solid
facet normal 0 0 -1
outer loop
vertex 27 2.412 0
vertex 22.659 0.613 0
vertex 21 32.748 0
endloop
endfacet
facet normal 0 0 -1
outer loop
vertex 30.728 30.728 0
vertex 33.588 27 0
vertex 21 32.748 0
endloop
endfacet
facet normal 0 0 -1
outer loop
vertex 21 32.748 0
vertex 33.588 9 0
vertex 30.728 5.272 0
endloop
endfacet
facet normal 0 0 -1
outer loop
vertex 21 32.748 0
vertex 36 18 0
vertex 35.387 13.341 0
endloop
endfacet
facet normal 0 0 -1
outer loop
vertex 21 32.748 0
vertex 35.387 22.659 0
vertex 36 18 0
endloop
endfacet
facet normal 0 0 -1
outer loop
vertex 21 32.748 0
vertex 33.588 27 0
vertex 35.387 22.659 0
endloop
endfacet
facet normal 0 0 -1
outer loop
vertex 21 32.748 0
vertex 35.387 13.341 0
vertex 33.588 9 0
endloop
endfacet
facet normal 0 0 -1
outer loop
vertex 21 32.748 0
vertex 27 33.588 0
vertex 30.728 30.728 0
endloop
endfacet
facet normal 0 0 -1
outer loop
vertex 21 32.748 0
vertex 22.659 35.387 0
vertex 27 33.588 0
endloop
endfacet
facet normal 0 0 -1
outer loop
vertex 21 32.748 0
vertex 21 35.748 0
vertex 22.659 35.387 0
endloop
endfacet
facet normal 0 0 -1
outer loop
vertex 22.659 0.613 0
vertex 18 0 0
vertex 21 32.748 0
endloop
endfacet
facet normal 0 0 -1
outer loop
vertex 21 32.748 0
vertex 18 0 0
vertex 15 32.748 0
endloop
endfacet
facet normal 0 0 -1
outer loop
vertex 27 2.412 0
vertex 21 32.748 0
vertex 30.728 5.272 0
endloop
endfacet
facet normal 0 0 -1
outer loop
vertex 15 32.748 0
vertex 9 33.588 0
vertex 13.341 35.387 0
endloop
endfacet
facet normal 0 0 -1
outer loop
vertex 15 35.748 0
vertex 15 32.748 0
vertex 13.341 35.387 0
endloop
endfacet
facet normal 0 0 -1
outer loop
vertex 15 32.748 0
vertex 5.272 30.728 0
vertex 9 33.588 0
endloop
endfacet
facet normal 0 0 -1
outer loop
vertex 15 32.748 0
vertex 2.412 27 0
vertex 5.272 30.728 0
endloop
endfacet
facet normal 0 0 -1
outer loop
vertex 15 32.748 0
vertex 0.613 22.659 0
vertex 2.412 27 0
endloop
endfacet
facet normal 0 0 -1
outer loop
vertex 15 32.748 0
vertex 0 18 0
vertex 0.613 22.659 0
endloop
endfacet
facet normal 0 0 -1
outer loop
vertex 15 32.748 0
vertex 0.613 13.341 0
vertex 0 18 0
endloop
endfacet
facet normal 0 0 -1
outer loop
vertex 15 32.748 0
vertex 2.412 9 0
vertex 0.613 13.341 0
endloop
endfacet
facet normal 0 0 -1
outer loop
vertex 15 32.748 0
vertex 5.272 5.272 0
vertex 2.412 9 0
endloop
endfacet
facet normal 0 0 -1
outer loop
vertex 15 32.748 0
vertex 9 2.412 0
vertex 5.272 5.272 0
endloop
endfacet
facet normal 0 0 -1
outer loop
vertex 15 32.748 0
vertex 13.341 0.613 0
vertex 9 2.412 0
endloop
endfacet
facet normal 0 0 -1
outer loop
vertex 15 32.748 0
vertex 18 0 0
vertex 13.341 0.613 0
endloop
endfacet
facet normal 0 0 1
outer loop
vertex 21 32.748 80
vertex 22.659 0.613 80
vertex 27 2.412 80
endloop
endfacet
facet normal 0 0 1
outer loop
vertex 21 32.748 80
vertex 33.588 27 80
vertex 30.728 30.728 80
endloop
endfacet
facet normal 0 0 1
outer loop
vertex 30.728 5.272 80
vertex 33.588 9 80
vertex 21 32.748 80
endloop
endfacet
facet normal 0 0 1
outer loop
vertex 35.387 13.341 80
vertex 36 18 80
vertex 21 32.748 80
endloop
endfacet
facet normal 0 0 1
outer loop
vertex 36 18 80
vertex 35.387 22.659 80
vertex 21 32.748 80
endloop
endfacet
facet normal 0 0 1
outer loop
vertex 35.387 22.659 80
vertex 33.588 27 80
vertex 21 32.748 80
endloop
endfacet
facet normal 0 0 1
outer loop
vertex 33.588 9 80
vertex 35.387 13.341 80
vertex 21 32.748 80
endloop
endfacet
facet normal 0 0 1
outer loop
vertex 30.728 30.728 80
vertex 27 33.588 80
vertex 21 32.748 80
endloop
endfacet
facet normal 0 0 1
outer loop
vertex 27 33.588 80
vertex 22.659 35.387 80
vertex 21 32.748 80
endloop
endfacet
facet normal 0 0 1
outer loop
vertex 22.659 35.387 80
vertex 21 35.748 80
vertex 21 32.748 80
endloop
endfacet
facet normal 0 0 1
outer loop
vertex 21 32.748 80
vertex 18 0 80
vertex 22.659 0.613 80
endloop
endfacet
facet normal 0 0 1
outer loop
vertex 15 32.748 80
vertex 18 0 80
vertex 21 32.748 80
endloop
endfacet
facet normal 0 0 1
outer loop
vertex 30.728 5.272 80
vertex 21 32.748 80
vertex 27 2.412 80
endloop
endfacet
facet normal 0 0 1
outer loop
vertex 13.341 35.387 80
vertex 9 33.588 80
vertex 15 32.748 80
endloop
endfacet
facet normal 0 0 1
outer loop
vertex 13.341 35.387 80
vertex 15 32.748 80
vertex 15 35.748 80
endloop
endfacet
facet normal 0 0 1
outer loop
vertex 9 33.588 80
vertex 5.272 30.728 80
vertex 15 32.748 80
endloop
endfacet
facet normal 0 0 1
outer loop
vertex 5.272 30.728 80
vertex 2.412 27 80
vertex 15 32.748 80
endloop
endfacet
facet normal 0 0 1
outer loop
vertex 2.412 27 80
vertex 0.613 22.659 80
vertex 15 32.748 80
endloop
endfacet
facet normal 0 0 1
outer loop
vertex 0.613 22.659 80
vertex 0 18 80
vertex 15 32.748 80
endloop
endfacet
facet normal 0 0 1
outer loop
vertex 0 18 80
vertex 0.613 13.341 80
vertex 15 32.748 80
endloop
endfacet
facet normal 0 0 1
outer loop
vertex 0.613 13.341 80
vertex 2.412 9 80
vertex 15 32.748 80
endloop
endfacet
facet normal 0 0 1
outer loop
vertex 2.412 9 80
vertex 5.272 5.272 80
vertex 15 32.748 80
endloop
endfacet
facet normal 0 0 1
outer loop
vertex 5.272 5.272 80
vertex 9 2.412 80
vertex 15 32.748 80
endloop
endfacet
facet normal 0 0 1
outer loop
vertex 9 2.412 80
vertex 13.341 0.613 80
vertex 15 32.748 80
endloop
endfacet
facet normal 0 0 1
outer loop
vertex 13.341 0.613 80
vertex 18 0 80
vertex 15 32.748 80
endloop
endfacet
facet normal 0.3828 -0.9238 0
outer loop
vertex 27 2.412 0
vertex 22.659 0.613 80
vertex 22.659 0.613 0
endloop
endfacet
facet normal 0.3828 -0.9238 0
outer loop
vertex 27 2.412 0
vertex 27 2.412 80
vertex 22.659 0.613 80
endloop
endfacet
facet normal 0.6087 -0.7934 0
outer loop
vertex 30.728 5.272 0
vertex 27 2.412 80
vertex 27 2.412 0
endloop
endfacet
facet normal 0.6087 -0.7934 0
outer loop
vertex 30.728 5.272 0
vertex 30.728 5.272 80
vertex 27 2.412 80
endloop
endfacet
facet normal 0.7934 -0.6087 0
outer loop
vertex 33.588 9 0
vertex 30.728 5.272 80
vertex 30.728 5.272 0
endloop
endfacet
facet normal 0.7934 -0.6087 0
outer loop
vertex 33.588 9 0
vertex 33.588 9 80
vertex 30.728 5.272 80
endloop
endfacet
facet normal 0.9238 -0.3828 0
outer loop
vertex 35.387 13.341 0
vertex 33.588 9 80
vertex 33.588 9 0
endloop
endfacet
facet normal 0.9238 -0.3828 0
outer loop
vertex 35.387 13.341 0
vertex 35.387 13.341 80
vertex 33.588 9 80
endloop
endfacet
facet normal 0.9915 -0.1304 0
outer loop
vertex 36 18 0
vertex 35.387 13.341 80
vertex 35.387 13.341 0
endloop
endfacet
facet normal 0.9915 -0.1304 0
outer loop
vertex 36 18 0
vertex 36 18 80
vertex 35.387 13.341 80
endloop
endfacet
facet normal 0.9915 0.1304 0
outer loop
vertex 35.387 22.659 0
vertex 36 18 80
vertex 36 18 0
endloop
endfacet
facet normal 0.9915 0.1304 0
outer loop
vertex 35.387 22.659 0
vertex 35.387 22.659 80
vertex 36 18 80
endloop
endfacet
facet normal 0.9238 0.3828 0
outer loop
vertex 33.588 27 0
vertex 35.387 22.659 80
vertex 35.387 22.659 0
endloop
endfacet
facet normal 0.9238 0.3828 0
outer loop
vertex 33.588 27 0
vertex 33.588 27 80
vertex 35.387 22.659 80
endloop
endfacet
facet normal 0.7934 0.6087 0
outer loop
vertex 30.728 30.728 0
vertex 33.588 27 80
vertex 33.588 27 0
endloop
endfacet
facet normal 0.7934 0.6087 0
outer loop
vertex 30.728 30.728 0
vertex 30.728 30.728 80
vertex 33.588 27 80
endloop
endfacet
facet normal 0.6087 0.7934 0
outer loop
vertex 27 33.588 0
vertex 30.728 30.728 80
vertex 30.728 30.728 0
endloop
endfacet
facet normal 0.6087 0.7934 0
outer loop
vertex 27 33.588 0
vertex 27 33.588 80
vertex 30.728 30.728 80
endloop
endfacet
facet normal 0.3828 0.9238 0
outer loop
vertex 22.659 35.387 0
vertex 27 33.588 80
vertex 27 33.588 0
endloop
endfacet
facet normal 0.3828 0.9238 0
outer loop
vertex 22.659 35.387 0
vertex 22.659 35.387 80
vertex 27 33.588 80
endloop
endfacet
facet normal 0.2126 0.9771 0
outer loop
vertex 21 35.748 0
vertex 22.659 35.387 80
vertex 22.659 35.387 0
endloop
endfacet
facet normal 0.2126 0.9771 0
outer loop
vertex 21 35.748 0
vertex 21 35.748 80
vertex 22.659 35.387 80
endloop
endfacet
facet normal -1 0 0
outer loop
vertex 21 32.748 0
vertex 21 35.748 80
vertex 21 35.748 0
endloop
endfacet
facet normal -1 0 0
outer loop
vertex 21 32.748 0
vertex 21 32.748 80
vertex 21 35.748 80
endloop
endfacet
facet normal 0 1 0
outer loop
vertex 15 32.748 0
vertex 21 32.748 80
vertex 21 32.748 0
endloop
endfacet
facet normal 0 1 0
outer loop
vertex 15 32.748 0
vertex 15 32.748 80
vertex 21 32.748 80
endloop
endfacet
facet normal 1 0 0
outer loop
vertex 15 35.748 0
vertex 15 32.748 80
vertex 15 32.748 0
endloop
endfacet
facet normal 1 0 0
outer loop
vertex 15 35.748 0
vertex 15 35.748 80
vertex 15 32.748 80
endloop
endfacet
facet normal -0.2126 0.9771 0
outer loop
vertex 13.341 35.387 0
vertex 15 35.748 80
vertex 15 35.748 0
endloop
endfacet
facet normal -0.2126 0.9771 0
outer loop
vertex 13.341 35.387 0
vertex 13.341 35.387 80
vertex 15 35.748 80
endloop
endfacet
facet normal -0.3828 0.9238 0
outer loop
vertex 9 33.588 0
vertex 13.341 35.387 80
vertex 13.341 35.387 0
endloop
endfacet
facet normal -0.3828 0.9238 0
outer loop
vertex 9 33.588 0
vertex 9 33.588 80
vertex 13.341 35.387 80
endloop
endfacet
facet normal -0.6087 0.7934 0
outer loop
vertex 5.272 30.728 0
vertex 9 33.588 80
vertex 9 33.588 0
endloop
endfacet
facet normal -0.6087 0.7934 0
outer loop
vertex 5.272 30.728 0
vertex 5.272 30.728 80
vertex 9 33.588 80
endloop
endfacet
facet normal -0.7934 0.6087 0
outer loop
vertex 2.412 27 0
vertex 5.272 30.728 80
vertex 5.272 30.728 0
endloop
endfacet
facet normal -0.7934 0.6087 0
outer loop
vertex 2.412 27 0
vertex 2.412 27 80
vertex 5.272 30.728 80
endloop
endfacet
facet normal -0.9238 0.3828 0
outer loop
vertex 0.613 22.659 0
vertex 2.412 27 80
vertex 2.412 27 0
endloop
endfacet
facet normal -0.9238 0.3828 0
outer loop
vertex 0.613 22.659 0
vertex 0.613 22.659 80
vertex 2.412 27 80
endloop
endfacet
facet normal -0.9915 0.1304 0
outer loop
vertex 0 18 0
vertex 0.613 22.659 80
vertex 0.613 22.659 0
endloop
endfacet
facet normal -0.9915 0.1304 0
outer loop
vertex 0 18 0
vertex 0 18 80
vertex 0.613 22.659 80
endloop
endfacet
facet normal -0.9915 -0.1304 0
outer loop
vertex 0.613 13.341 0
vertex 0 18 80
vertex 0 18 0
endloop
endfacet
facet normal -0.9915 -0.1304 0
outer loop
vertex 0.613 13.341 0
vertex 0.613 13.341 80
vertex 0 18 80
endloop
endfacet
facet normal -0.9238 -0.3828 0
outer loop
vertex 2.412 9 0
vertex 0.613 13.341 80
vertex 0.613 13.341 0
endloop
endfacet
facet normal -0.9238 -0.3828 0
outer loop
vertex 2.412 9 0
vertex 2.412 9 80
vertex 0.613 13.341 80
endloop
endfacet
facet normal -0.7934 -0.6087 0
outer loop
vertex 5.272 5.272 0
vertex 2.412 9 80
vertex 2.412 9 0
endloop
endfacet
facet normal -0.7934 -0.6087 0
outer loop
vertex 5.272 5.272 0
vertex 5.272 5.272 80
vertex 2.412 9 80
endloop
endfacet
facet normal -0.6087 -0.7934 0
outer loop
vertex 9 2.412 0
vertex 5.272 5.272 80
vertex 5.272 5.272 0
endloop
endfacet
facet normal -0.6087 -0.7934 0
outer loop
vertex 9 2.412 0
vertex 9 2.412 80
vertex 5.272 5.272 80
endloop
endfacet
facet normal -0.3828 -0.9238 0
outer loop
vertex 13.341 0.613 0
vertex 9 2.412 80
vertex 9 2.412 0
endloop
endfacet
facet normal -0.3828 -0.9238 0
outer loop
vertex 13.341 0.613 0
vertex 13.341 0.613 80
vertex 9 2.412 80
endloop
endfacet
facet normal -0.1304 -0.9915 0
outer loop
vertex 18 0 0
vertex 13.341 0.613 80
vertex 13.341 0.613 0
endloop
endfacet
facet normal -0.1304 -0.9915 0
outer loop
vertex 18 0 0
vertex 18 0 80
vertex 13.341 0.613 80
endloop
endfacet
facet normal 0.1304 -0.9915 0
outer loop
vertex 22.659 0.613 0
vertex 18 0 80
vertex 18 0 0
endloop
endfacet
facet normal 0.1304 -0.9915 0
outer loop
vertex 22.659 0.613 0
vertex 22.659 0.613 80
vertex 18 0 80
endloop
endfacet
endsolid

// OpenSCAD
$fn = 32;

// ----------------------------------------------------------------------
// Keyway shaft: d36 shaft, key 6 x 3 mm
// ----------------------------------------------------------------------

// --- parameters (mm) ---
shaft_r = 18;             // shaft radius
key_w = 6;                // keyway width
key_d = 3;                // keyway depth below the surface line
plate_t = 80;             // shaft length, Z (extrusion height)
fit_tol = 0.02;           // declared fit tolerance (prompt contract)
free_tol = 0.2;           // declared free tolerance (prompt contract)

shaft_d = 2 * shaft_r;  // shaft diameter
circle_step = 15;  // polygon sampling step, degrees

profile = [[13.341, 35.387], [9, 33.588], [5.272, 30.728], [2.412, 27], [0.613, 22.659], [0, 18], [0.613, 13.341], [2.412, 9], [5.272, 5.272], [9, 2.412], [13.341, 0.613], [18, 0], [22.659, 0.613], [27, 2.412], [30.728, 5.272], [33.588, 9], [35.387, 13.341], [36, 18], [35.387, 22.659], [33.588, 27], [30.728, 30.728], [27, 33.588], [22.659, 35.387], [21, 35.748], [21, 32.748], [15, 32.748], [15, 35.748]];  // primary outline, 27 points, counter clockwise

// --- the one profile operation ---
linear_extrude(height = plate_t) polygon(points = profile);
